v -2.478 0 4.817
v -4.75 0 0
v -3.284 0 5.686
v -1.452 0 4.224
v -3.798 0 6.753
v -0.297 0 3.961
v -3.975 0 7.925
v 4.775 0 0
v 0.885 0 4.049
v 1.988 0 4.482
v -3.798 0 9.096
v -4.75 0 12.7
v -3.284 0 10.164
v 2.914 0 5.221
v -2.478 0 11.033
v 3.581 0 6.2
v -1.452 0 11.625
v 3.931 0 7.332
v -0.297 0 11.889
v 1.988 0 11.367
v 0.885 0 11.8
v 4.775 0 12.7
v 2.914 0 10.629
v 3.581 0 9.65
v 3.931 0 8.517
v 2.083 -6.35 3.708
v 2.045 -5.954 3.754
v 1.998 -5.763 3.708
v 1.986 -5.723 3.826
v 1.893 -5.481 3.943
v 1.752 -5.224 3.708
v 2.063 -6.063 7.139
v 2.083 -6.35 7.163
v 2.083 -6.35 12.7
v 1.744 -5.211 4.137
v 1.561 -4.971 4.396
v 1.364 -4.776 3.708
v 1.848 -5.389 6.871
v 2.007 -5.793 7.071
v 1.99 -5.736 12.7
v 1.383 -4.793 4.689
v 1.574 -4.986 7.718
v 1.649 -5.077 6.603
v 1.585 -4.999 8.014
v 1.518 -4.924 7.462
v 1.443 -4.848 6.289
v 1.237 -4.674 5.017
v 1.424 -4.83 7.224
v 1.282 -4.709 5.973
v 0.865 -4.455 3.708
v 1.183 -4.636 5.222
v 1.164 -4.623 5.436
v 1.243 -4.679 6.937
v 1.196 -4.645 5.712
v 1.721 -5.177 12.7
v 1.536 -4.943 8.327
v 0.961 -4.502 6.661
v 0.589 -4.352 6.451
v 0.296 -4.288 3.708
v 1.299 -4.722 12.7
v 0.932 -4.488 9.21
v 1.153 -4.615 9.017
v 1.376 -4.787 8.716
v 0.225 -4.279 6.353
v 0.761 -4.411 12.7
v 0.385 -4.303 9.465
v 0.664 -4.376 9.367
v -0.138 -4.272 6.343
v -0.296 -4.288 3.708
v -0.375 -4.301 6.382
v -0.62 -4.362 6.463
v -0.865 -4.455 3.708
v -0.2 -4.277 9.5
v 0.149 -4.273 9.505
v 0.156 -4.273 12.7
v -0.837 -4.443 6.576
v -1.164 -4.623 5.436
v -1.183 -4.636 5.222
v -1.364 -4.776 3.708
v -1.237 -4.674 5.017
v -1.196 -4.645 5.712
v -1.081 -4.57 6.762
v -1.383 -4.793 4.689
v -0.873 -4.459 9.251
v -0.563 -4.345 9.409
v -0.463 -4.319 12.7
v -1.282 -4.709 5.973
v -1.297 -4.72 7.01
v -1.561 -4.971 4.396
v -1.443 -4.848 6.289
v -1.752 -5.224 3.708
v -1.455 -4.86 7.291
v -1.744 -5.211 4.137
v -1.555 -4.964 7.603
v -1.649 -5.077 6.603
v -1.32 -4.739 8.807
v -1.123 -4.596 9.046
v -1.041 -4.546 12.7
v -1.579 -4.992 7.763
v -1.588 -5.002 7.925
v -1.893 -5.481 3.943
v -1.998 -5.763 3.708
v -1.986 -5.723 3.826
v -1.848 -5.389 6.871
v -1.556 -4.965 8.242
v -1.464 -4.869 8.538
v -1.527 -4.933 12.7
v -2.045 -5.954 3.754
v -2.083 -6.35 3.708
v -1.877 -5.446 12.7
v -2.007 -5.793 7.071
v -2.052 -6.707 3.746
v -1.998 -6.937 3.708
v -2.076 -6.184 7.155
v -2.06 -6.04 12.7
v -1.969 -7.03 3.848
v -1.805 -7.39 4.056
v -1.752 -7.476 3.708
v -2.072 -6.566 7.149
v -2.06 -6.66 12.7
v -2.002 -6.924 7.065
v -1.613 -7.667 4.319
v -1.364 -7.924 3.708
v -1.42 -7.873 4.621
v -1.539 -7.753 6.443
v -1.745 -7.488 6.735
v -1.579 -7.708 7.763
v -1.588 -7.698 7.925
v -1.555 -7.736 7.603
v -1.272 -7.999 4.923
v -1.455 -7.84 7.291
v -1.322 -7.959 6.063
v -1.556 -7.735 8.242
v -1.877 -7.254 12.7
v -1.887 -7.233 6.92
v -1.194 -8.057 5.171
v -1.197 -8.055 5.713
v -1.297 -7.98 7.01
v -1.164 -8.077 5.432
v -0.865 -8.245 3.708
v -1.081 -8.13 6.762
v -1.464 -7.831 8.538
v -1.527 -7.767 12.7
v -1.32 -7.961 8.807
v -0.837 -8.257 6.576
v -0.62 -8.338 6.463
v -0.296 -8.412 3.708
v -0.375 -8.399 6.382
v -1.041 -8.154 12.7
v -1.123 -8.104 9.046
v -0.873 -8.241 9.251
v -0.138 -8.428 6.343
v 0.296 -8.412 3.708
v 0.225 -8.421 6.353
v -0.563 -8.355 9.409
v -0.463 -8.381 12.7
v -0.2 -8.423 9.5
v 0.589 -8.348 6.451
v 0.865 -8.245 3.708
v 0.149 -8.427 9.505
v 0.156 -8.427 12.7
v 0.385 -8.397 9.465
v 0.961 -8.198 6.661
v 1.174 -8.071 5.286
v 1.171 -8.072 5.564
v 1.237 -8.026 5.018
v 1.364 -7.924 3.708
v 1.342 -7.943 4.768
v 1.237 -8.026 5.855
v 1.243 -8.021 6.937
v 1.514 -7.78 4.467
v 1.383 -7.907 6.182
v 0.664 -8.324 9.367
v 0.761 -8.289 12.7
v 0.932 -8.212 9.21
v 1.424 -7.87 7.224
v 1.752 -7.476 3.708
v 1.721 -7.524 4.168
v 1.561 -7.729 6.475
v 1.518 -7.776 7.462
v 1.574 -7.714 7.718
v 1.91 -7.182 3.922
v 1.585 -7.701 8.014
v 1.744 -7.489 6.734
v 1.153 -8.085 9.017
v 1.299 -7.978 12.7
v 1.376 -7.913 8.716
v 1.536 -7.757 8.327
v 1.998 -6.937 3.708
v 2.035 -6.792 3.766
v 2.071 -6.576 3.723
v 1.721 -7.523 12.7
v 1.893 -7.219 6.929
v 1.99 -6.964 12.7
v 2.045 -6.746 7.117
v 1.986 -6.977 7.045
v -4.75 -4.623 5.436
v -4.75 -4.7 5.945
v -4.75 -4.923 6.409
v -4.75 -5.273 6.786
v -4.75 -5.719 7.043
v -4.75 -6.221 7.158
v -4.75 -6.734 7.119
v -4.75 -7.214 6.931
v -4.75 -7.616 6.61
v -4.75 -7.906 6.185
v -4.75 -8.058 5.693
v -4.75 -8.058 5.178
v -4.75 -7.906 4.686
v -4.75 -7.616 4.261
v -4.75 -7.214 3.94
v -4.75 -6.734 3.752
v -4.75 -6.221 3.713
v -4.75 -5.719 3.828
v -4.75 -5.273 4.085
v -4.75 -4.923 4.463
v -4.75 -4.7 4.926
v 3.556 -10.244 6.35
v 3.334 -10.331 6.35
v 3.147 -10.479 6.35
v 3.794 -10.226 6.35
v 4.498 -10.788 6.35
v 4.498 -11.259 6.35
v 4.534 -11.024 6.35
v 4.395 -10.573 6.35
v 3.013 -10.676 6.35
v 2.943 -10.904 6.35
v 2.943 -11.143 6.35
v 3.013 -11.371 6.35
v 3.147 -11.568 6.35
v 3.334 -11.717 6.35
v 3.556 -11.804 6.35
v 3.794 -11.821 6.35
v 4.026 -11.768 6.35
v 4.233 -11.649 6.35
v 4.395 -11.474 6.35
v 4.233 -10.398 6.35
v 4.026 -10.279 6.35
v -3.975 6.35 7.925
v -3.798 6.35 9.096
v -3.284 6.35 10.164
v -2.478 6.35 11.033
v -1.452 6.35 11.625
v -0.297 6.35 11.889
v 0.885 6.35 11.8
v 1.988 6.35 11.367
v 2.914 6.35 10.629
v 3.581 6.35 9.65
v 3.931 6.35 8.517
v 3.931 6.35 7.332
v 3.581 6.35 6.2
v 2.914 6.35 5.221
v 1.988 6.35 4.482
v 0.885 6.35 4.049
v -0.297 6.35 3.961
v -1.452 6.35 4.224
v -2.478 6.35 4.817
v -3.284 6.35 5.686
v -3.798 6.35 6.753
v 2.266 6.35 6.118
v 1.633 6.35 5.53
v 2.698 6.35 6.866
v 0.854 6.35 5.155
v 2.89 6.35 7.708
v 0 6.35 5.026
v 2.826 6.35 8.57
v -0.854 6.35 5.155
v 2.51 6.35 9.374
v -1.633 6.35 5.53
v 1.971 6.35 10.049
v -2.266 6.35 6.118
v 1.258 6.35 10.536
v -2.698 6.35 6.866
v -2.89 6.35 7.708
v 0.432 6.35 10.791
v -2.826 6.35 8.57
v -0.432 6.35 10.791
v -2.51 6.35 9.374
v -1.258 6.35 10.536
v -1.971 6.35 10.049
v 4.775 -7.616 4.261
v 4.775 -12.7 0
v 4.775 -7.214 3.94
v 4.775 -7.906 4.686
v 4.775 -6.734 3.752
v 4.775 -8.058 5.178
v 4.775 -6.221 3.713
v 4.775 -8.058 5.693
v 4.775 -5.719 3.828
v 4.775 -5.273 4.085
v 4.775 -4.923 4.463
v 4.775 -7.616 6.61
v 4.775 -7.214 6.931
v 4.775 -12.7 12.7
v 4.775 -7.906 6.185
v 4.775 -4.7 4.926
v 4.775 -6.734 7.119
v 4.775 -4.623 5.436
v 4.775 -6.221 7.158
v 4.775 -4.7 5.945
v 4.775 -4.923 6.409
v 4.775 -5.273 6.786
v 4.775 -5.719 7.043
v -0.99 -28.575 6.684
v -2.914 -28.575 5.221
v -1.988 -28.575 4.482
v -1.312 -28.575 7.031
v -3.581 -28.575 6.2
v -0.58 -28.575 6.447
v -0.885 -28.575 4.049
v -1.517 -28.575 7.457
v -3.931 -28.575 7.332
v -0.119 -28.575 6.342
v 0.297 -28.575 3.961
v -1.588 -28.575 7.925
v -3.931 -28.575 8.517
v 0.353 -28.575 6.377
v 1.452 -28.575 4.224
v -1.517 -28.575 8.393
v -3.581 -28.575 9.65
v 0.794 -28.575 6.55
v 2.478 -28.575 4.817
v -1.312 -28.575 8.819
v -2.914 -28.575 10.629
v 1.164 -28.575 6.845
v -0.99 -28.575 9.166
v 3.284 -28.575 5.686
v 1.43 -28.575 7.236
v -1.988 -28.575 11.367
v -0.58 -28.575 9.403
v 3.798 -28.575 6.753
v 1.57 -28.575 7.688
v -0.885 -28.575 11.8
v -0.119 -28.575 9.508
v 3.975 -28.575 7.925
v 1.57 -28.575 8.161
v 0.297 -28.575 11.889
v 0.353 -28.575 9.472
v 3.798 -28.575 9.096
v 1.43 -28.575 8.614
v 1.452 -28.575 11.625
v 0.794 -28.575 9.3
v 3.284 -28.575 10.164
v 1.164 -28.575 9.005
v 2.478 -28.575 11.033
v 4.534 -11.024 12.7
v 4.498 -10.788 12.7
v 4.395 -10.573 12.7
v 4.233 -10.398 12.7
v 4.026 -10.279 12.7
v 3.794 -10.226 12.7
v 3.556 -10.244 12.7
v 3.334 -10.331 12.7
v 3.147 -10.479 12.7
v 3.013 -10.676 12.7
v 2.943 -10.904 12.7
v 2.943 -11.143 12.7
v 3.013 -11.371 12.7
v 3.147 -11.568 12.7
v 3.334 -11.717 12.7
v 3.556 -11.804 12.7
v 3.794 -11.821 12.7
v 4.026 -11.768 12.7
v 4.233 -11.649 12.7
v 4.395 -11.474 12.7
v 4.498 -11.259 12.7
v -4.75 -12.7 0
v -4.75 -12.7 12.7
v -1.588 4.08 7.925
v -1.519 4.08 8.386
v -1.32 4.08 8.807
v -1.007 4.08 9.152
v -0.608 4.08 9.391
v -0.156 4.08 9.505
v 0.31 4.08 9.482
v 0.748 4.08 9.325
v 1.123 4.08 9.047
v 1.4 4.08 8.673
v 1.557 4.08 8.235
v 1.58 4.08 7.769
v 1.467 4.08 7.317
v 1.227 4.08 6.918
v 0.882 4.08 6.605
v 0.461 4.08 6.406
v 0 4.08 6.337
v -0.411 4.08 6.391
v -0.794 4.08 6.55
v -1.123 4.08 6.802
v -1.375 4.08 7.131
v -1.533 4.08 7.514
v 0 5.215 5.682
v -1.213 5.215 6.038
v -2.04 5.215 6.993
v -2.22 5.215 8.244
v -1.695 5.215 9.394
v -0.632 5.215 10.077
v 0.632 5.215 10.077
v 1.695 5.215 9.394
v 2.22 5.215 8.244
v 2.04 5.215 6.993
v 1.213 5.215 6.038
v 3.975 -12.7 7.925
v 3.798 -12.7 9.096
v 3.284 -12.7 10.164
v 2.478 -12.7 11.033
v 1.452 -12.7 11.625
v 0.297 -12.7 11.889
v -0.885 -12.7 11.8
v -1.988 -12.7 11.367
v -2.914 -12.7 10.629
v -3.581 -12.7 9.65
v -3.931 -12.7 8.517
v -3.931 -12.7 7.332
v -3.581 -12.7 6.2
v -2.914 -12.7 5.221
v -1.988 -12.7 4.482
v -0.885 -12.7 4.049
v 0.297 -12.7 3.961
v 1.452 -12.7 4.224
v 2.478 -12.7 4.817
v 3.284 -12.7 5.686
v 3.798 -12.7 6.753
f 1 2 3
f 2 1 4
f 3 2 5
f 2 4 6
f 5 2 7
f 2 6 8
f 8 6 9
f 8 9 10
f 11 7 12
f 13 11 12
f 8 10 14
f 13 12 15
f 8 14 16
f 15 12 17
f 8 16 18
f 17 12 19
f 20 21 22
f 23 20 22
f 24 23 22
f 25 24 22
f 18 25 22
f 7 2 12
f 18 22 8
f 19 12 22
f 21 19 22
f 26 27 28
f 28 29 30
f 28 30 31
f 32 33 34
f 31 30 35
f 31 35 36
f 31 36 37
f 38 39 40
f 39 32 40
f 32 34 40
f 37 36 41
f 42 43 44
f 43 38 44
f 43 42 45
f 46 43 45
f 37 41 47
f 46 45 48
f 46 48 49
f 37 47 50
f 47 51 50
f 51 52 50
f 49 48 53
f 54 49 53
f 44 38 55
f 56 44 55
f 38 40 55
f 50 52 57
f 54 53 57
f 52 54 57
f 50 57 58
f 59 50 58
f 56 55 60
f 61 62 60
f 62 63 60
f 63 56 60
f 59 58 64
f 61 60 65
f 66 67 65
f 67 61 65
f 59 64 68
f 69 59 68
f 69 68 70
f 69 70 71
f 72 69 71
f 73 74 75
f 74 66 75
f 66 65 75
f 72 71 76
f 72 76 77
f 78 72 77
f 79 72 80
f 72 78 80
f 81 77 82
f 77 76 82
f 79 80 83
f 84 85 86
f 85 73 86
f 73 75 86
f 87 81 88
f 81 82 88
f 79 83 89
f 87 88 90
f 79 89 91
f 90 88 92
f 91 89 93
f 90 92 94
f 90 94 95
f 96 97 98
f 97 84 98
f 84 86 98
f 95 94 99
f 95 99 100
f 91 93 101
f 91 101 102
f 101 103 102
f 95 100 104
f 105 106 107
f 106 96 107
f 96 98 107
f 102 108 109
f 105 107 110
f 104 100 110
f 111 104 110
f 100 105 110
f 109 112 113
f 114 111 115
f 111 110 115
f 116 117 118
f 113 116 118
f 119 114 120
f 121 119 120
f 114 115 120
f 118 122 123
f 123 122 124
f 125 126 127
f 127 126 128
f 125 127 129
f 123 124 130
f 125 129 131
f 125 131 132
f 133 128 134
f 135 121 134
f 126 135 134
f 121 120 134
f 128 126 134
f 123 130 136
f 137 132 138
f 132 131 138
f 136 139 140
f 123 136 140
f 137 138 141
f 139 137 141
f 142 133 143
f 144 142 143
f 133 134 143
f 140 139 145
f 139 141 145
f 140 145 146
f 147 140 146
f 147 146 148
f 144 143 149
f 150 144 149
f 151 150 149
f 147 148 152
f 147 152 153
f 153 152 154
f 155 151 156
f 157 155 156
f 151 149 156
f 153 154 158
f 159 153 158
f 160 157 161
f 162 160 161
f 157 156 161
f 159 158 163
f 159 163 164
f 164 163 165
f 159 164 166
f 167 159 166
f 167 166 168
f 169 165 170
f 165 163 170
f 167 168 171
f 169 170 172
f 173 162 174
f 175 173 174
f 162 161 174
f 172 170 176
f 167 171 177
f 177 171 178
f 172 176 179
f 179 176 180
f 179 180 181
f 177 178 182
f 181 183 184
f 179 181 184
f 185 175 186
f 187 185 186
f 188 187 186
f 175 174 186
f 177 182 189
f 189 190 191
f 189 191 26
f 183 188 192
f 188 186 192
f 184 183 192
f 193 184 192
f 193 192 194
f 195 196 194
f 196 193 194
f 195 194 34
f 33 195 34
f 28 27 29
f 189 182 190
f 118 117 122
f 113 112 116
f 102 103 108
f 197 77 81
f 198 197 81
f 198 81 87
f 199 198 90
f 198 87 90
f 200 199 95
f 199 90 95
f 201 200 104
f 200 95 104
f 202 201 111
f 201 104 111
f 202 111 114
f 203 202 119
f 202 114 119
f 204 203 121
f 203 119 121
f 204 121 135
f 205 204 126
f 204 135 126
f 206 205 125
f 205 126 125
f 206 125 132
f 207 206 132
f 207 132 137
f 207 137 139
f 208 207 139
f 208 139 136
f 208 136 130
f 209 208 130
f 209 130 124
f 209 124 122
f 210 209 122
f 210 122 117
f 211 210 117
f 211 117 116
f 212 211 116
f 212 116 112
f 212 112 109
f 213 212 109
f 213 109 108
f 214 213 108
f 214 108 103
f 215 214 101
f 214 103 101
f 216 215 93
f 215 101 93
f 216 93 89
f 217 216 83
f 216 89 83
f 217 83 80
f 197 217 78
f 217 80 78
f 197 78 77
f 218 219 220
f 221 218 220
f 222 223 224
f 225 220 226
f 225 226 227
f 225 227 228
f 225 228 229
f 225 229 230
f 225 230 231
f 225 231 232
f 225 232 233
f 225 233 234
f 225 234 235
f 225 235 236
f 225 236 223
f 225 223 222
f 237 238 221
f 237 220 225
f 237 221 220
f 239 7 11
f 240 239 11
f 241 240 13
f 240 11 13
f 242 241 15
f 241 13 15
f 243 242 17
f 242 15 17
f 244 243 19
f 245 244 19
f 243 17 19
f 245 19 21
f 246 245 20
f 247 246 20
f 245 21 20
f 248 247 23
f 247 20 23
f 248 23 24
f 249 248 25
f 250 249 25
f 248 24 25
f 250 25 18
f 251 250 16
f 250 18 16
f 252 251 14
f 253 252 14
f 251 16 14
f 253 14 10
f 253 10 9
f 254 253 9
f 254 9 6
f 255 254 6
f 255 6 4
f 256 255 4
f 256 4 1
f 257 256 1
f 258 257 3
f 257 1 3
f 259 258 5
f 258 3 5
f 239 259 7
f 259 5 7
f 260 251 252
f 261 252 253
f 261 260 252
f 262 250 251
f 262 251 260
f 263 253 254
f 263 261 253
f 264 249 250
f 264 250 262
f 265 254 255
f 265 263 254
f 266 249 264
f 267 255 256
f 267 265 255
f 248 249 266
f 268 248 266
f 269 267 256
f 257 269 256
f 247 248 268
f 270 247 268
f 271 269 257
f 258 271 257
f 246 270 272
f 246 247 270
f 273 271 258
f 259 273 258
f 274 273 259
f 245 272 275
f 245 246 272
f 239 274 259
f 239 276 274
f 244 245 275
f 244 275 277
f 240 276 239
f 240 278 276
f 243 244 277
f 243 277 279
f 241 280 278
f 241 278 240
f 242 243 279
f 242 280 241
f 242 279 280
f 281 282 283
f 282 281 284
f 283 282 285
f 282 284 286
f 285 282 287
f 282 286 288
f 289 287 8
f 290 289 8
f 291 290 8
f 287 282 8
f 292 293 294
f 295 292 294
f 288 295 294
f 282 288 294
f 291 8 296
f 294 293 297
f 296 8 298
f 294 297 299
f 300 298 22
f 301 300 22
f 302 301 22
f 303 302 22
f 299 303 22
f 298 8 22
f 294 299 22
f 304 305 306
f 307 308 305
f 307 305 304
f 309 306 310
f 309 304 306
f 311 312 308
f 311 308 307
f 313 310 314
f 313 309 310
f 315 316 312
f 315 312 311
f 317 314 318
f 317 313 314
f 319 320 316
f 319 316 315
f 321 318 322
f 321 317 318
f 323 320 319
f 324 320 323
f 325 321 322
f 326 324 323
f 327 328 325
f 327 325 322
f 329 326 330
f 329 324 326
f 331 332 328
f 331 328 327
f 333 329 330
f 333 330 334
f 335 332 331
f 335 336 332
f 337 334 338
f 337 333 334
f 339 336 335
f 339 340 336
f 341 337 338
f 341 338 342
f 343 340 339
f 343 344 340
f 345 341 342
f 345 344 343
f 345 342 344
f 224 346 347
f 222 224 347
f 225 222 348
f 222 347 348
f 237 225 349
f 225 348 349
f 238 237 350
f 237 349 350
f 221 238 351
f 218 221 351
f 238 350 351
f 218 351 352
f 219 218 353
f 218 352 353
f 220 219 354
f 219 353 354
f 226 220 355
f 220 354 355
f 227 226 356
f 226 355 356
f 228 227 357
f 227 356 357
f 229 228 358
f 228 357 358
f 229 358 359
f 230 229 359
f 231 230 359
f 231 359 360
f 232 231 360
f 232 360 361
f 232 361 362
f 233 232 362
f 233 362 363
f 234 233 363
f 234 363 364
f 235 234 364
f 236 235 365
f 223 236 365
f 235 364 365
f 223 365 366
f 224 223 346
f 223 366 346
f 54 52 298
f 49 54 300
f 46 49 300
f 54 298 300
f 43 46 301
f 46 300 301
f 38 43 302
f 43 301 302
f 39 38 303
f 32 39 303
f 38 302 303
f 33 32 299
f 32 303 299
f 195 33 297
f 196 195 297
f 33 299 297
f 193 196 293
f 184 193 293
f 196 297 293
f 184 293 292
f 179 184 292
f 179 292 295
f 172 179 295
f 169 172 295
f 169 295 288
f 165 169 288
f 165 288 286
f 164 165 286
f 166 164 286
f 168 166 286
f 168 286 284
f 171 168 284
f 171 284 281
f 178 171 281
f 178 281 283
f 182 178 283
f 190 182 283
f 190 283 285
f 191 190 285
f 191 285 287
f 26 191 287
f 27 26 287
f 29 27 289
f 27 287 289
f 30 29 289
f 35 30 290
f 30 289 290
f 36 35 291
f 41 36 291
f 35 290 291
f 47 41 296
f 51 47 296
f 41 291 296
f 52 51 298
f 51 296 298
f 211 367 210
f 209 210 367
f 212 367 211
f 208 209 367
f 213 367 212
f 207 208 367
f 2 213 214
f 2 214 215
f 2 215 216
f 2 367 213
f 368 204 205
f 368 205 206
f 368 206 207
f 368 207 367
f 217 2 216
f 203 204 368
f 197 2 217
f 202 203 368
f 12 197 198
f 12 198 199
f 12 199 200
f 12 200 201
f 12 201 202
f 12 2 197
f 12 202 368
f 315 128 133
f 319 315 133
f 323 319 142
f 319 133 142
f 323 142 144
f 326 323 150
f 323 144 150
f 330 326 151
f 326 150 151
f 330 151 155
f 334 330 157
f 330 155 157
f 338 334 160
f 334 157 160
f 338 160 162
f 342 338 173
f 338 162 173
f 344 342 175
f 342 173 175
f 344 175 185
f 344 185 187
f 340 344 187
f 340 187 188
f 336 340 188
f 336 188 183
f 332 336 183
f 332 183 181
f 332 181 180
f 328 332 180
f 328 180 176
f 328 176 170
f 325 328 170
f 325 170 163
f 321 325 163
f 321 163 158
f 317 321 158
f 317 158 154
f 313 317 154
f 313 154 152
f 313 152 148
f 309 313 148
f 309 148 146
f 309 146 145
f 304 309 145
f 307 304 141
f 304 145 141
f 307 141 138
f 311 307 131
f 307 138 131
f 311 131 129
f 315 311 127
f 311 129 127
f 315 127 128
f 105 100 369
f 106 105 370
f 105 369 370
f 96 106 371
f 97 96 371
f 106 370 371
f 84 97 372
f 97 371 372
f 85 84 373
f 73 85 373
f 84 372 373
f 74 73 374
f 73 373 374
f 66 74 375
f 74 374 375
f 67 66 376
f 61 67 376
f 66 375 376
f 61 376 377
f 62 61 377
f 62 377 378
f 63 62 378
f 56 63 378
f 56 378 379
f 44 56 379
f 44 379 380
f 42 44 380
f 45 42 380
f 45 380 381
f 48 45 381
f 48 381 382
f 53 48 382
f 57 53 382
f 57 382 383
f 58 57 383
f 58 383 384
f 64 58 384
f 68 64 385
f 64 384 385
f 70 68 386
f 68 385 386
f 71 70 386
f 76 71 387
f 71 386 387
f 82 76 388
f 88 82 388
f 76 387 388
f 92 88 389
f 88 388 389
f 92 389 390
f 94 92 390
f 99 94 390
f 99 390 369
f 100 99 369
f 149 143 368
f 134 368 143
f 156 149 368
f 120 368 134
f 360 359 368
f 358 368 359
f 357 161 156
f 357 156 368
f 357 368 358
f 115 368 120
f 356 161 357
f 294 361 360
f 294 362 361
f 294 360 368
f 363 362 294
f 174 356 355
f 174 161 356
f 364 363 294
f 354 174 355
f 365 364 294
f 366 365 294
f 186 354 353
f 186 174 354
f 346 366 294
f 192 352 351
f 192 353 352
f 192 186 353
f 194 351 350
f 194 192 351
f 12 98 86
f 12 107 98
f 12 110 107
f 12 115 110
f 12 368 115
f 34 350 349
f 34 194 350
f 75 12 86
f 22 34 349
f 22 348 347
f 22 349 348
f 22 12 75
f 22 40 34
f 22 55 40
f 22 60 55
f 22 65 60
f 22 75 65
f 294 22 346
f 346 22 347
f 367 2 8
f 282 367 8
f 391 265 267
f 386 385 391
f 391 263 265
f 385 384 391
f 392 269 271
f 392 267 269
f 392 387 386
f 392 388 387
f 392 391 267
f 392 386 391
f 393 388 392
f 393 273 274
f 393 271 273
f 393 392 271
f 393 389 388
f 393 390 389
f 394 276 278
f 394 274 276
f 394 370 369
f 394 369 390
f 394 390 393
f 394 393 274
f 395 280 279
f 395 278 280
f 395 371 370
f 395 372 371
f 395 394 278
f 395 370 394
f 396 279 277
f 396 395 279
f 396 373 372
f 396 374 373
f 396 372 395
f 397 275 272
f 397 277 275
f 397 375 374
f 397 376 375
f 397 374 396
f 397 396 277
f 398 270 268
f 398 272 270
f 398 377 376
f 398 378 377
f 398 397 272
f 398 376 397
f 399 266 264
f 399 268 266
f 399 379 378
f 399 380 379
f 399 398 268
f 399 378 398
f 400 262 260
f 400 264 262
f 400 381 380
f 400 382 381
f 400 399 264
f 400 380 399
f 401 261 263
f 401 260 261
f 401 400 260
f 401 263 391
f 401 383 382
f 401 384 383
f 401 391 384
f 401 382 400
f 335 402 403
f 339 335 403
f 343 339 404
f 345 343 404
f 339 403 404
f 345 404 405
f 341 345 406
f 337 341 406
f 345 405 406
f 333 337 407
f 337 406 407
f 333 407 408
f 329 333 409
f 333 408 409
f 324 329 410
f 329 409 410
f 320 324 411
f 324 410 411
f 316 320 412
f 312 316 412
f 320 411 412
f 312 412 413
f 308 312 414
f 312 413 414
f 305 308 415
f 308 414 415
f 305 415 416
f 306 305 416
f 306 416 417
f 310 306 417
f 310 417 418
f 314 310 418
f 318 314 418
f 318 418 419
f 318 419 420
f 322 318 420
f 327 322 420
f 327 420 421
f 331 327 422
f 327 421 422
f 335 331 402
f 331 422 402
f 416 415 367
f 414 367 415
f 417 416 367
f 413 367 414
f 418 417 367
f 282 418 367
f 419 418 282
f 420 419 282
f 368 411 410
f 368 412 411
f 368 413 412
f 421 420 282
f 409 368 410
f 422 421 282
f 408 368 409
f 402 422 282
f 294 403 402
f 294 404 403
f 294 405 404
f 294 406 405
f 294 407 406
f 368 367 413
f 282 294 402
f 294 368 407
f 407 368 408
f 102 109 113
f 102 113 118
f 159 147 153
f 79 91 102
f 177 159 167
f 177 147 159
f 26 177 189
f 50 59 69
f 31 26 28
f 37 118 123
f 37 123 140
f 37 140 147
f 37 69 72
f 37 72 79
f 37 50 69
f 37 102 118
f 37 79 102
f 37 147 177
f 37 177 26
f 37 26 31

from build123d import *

# Parameters (mm, degrees)
F0_W      = 9.525
F0_H      = 12.7
F1_DEPTH  = 12.7
F2_R      = 3.9751
F3_DEPTH  = 15.875
F4_R      = 3.9751
F5_DEPTH  = 6.35
F6_R      = 1.5875
F7_DEPTH  = 34.926
F8_R      = 1.7272
F9_DEPTH  = 9.526
F10_R     = 2.0828
F11_DEPTH = 8.9916
F12_R     = 0.8001
F13_DEPTH = 6.35


with BuildPart() as f1:
    # F0 (on Front) → F1 (new body)
    with BuildSketch(Plane.XZ):
        with Locations((0.0127, 6.35)):
            Rectangle(F0_W, F0_H)
    extrude(amount=F1_DEPTH)

    # F2 (on face) → F3 (join)
    with BuildSketch(Plane.XZ.offset(12.7)):
        with Locations((0, 7.9248)):
            Circle(F2_R)
    extrude(amount=F3_DEPTH)

    # F4 (on face) → F5 (join)
    with BuildSketch(Plane(origin=(0, 0, 0), x_dir=(-1, 0, 0), z_dir=(0, 1, 0))):
        with Locations((0, 7.9248)):
            Circle(F4_R)
    extrude(amount=F5_DEPTH)

    # F6 (on face) → F7 (cut, through all)
    with BuildSketch(Plane(origin=(0, 6.35, 0), x_dir=(-1, 0, 0), z_dir=(0, 1, 0))):
        with Locations((0, 7.9248)):
            Circle(F6_R)
    extrude(amount=-F7_DEPTH, mode=Mode.SUBTRACT)

    # F8 (on face) → F9 (cut, through all)
    with BuildSketch(Plane.YZ.offset(4.7752)):
        with Locations((-6.35, 5.4356)):
            Circle(F8_R)
    extrude(amount=-F9_DEPTH, mode=Mode.SUBTRACT)

    # F10 (on face) → F11 (cut)
    with BuildSketch(Plane.XY.offset(12.7)):
        with Locations((0, -6.35)):
            Circle(F10_R)
    extrude(amount=-F11_DEPTH, mode=Mode.SUBTRACT)

    # F12 (on face) → F13 (cut)
    with BuildSketch(Plane.XY.offset(12.7)):
        with Locations((3.7338, -11.0236)):
            Circle(F12_R)
    extrude(amount=-F13_DEPTH, mode=Mode.SUBTRACT)

    # F15: sweep along a path in F15_path
    with BuildLine(Plane(origin=(-3.9751, 6.35, 7.9248), x_dir=(0, 0, -1), z_dir=(0, 1, 0))) as f15_path:
        CenterArc((0, -3.9751), 3.9751, 0, 360)
    # F14 (on Right) → F15 (sweep, cut)
    with BuildSketch(Plane.YZ):
        Polygon((6.3891997561, 7.9248), (6.3891997561, 10.8458), (3.8409422638, 9.3745628509), (3.8409422638, 7.9248), align=None)
    sweep(path=f15_path.line, mode=Mode.SUBTRACT)


solid = f1.part
